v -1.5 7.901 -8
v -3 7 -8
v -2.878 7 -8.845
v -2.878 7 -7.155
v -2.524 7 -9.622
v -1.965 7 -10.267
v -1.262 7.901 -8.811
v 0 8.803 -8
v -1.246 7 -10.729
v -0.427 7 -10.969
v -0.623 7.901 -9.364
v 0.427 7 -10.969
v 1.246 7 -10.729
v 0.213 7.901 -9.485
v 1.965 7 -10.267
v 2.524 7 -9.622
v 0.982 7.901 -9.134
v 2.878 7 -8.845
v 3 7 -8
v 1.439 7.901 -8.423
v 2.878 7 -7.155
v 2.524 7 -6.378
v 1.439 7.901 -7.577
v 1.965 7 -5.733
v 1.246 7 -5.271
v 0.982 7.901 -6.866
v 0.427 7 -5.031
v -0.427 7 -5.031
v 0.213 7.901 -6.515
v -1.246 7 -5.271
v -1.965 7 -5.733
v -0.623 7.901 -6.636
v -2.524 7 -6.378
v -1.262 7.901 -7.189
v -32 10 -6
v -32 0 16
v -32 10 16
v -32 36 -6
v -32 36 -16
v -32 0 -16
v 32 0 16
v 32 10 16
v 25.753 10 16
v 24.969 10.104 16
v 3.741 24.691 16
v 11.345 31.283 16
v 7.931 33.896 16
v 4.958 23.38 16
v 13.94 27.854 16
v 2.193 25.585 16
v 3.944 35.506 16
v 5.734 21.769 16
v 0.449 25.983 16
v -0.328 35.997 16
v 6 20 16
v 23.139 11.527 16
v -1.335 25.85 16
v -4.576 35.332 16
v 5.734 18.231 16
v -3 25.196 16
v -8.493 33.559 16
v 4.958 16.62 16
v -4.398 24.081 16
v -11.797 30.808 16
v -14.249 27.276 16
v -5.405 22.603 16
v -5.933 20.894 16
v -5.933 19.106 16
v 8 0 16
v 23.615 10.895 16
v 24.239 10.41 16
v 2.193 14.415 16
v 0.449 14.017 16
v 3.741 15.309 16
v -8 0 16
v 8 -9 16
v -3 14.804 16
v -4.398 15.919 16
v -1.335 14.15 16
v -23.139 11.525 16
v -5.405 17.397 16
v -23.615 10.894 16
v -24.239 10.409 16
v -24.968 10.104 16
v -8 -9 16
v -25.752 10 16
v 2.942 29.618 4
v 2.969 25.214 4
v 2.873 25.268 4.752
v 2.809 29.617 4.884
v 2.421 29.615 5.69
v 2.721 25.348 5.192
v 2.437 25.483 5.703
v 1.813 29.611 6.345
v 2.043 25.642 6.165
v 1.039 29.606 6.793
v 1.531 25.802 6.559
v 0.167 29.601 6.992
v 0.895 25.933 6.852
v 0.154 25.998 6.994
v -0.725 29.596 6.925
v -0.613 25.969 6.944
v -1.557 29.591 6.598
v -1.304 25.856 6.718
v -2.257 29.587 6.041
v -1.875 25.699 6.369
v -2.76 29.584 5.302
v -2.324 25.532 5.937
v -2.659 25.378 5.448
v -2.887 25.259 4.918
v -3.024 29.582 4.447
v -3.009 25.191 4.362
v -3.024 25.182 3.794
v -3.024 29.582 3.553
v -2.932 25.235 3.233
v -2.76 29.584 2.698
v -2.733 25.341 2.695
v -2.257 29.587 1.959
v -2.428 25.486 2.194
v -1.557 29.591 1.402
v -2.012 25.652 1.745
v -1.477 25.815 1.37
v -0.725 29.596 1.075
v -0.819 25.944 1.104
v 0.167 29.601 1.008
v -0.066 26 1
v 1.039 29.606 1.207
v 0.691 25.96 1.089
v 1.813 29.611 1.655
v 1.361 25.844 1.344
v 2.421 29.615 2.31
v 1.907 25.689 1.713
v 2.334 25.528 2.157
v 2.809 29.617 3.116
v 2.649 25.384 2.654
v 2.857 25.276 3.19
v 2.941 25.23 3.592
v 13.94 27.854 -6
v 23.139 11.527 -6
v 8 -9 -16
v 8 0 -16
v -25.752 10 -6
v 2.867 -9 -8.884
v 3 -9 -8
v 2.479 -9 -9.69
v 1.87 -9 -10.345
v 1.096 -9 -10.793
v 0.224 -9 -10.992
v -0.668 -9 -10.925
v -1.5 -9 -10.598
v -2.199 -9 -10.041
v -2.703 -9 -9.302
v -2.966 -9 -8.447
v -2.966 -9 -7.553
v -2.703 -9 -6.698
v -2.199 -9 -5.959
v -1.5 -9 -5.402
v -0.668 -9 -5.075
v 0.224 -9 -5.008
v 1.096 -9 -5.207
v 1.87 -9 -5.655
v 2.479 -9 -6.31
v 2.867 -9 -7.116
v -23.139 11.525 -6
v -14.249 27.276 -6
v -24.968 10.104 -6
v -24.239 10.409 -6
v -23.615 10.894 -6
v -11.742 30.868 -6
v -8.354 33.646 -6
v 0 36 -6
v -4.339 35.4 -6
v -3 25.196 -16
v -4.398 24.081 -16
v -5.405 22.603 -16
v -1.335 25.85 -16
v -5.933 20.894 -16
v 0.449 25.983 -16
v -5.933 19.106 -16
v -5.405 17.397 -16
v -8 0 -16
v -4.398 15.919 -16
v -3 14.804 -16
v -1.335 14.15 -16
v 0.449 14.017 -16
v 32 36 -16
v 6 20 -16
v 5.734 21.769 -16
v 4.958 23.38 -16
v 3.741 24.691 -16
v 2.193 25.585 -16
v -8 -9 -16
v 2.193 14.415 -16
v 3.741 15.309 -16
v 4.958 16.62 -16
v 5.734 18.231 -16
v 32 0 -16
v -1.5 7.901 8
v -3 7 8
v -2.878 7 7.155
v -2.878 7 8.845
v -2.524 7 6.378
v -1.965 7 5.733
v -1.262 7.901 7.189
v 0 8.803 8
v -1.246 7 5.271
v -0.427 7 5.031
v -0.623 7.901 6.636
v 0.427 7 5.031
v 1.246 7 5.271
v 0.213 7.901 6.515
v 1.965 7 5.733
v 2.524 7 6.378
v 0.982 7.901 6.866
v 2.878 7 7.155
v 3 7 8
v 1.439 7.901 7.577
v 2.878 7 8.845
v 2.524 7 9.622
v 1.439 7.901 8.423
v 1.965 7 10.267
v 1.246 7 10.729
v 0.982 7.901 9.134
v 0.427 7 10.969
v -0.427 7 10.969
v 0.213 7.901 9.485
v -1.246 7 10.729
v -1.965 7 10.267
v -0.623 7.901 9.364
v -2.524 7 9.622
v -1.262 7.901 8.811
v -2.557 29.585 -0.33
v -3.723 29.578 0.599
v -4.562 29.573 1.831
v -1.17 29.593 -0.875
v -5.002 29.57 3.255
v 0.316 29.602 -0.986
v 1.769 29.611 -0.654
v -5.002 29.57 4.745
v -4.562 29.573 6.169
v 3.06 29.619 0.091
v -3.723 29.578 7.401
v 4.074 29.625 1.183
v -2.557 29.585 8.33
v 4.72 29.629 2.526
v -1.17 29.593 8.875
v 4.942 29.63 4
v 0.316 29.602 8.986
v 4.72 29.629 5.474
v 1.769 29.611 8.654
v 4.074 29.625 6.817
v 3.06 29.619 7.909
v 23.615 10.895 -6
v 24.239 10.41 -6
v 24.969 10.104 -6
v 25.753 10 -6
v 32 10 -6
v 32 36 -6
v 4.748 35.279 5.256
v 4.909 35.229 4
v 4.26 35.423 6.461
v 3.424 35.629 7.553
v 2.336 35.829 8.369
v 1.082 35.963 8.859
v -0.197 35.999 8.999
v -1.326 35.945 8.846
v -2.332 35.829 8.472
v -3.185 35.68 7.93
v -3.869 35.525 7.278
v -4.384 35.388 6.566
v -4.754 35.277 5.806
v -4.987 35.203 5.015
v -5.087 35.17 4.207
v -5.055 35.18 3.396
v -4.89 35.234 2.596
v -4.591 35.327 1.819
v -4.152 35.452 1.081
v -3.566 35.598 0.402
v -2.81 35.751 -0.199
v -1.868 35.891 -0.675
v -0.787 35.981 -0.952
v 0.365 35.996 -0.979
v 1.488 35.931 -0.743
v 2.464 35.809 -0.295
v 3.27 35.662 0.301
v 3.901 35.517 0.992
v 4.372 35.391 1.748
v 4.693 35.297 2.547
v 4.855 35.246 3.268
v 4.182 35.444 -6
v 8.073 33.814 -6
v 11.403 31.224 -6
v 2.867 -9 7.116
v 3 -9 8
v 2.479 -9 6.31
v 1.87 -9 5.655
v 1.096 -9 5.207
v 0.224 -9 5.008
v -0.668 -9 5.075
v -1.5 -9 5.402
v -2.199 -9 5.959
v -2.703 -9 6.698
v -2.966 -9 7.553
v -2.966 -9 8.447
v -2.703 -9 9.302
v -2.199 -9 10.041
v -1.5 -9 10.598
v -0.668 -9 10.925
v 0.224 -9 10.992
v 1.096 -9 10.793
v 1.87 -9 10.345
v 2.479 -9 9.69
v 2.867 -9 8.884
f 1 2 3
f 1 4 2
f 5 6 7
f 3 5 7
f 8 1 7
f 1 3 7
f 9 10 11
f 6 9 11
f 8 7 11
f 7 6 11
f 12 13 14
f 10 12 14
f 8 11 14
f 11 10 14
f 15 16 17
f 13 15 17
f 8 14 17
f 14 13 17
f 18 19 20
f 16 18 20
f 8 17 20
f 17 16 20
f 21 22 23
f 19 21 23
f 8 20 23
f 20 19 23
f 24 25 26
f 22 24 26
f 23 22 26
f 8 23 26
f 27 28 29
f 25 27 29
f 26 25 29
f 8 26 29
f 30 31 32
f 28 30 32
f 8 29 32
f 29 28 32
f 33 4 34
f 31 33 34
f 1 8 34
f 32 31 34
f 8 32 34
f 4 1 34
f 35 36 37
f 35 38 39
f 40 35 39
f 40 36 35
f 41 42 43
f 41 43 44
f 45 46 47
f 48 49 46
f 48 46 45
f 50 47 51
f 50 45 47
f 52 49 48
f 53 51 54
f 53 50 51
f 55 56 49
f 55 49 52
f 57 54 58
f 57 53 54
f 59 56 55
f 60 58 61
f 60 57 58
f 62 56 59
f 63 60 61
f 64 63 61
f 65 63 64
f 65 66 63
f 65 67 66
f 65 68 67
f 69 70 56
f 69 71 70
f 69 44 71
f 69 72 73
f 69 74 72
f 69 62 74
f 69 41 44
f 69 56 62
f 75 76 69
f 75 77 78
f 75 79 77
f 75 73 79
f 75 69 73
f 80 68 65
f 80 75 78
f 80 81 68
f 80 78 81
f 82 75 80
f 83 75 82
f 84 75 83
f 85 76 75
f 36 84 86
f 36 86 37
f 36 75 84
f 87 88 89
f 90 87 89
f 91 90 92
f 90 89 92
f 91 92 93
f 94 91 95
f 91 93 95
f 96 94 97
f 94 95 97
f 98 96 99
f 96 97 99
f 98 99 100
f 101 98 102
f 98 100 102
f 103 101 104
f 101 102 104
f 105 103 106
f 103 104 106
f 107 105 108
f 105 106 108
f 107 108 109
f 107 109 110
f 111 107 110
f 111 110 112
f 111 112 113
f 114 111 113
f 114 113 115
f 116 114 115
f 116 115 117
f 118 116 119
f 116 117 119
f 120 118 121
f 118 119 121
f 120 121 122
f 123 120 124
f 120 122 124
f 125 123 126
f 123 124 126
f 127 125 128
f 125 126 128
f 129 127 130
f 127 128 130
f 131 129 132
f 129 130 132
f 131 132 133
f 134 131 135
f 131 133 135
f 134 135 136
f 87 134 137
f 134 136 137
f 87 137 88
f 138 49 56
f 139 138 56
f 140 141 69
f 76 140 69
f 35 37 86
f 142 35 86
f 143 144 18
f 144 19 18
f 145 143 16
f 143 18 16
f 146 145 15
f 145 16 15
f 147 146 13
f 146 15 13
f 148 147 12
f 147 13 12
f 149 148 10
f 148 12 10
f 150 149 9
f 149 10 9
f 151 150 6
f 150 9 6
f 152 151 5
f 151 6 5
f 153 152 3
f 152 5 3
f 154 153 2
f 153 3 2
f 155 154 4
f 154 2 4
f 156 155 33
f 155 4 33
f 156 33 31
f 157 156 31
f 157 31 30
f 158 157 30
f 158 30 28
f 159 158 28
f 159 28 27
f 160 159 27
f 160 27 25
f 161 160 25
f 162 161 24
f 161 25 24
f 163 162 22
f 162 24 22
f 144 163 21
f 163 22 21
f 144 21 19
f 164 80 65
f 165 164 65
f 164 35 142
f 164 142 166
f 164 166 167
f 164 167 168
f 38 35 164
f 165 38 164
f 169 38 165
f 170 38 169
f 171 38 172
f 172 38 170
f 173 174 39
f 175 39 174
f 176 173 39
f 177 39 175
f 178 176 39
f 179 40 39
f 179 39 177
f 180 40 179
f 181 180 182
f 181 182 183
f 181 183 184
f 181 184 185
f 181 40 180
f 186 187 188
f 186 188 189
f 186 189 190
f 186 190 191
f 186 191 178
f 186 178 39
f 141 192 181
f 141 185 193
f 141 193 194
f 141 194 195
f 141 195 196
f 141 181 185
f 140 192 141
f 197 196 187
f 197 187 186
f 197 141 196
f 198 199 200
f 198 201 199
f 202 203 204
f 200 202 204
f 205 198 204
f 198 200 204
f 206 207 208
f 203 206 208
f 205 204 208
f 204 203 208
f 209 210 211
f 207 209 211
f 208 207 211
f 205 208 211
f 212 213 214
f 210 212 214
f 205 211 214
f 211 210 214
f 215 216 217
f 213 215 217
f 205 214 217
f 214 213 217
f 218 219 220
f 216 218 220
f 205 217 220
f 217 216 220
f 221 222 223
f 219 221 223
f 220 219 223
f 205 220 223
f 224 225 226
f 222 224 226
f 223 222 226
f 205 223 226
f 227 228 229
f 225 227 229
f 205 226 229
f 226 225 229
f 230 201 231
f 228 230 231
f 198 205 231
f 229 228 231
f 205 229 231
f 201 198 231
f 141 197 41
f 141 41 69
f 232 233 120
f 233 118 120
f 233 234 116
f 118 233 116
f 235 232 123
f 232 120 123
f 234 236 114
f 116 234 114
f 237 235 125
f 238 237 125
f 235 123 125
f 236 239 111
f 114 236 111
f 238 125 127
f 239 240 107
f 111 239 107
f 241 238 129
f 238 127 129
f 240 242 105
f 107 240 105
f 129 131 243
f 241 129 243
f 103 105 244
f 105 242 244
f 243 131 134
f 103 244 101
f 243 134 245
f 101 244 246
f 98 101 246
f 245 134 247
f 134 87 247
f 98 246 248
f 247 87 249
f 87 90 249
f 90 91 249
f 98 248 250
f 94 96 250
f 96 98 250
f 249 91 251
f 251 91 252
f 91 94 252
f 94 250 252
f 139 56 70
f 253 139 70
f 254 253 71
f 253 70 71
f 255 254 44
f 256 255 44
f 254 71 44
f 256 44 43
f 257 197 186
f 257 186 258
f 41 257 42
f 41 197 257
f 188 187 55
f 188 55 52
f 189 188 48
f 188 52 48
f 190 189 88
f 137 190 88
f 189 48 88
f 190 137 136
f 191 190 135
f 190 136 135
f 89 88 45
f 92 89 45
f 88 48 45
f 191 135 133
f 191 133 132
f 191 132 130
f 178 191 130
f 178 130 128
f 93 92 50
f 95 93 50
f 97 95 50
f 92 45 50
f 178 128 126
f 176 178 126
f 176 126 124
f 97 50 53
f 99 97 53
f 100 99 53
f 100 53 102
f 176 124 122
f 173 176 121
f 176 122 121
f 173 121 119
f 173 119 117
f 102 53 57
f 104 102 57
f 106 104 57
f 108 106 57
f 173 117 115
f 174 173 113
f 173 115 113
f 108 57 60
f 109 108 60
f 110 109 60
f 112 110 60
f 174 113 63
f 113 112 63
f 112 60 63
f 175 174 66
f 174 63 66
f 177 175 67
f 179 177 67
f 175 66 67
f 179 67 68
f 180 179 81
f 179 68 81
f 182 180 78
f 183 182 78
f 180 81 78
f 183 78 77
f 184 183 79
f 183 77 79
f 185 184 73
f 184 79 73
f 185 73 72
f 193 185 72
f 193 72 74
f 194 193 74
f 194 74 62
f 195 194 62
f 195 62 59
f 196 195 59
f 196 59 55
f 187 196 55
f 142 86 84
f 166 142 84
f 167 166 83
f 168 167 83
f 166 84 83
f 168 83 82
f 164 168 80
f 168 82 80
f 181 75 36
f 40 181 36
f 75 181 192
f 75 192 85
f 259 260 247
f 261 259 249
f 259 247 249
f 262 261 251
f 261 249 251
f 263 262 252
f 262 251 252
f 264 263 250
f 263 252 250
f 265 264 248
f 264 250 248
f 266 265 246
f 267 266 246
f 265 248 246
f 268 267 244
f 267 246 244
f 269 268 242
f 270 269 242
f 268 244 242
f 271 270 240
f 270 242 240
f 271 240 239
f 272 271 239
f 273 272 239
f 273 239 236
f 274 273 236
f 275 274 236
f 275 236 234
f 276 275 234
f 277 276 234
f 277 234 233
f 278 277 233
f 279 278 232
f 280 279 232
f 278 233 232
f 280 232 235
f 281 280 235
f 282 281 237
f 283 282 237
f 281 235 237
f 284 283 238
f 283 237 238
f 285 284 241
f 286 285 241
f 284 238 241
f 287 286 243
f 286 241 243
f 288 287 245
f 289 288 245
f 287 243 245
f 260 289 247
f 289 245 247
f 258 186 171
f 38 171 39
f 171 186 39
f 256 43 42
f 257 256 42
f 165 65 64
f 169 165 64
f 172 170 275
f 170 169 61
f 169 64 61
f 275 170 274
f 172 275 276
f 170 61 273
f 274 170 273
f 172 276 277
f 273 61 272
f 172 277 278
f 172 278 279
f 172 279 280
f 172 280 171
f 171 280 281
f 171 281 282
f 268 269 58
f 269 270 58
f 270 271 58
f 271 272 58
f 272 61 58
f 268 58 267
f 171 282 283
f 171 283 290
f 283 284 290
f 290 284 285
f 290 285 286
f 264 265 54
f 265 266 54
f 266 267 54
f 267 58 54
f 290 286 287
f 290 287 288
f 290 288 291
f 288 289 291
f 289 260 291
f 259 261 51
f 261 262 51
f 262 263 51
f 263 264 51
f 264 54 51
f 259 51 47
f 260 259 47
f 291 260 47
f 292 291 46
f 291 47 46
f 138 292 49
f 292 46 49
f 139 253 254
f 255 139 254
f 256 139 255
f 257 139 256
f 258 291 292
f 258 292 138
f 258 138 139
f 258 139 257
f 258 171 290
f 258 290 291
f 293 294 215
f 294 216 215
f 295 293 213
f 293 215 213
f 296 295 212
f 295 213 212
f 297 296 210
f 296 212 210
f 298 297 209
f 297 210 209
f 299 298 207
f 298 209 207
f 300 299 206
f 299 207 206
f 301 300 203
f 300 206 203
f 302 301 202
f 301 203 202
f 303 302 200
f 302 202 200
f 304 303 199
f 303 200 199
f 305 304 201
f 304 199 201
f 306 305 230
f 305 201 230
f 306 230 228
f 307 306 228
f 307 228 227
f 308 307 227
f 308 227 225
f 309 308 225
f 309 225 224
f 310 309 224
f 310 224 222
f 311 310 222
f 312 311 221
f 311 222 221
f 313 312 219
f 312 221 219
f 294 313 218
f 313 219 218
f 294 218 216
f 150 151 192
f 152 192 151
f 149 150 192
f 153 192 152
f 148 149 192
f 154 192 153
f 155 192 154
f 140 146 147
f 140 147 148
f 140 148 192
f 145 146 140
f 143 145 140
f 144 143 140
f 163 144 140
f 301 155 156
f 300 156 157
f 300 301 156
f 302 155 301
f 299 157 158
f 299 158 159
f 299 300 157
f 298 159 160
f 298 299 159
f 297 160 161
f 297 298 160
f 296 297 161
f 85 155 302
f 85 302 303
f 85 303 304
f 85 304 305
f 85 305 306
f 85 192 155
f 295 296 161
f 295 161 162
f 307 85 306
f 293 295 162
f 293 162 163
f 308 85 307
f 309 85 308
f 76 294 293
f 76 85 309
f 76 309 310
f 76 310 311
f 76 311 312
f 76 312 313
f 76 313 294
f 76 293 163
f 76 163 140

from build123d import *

# Parameters (mm, degrees)
BOSS_EXTRUDE1_DEPTH       = 36
CUT_EXTRUDE6_DEPTH        = 22
SKETCH11_R                = 6.000000000000001
CUT_EXTRUDE7_DEPTH        = 58.827329183593626
SKETCH12_W                = 16
SKETCH12_H                = 32
BOSS_EXTRUDE2_DEPTH       = 9
F_1_0MM_DOWEL_HOLE1_D     = 6
F_1_0MM_DOWEL_HOLE1_DEPTH = 16
F_1_0MM_DOWEL_HOLE1_TIP   = 1.8025818570826808


# Read off the part's stored shape, not the designer's step: CBORE for M6 Hex Socket Head Cap Screw2
with BuildPart() as part:
    # Sketch1 → Boss-Extrude1 (new body)
    with BuildSketch(Plane(origin=(0, 0, 0), x_dir=(1, 0, 0), z_dir=(0, 1, 0))):
        Polygon((-32.000000000000014, 16), (32, 16), (32, -16), (-32.00000000000001, -16), align=None)
    extrude(amount=BOSS_EXTRUDE1_DEPTH)

    # Sketch2 → Cut-Extrude6 (cut)
    with BuildSketch(Plane.XY.offset(16)):
        with BuildLine():
            Line((0.00047501965244123, 36), (-32.00000000000001, 36))
            Line((-32.00000000000001, 36), (-32.00000000000001, 10))
            Line((-32.00000000000001, 10), (-25.751640415984067, 10))
            ThreePointArc((-25.751640415984067, 10), (-24.238970505556754, 10.409280072626942), (-23.139037695662964, 11.5254468386081))
            Line((-23.139037695662964, 11.5254468386081), (-14.249494850462119, 27.275875122834456))
            ThreePointArc((-14.249494850462119, 27.275875122834453), (-8.35374541517065, 33.645768615897694), (0.00047501965243812, 36.00000000705136))
        make_face()
        with BuildLine():
            Line((31.999999999999993, 36), (0.00047501965244123, 36))
            ThreePointArc((0.00047501965243812, 36.00000000705136), (8.07302482579058, 33.814265808302636), (13.940018609128462, 27.85424246049306))
            Line((13.940018609128462, 27.85424246049306), (23.139425445581196, 11.527329539979691))
            ThreePointArc((23.139425445581196, 11.527329539979691), (24.239486779956046, 10.409825162265975), (25.753089868605628, 10))
            Line((25.753089868605628, 10), (32, 10.000000000000002))
            Line((32, 10.000000000000002), (32, 36))
        make_face()
    extrude(amount=-CUT_EXTRUDE6_DEPTH, mode=Mode.SUBTRACT)

    # Sketch11 → Cut-Extrude7 (cut, through all)
    with BuildSketch(Plane.XY.offset(16)):
        with Locations((0.00047501966492051, 20.000000007051366)):
            Circle(SKETCH11_R)
    extrude(amount=-CUT_EXTRUDE7_DEPTH, mode=Mode.SUBTRACT)

    # Sketch12 → Boss-Extrude2 (add)
    with BuildSketch(Plane.XZ):
        Rectangle(SKETCH12_W, SKETCH12_H)
    extrude(amount=BOSS_EXTRUDE2_DEPTH)

    # CBORE for M6 Hex Socket Head Cap Scr 2 → CBORE for M6 Hex Socket Head Cap Screw2 (revolve, cut)
    with BuildSketch(Plane(origin=(0.121141314, 0.00073091, 3.999999998), x_dir=(0.9999817987234716, 0.006033425376210058, 0), z_dir=(0, 0, -1))):
        Polygon((3, -29.599633116), (3, -25.195487191), (0, -25.195487191), (0, -35.999736435), (5, -35.999736435), (5, -29.599633116), align=None)
    revolve(axis=Axis((0.121141314, 0.00073091, 3.999999998), (0.006033425376210058, -0.9999817987234716, 0)), mode=Mode.SUBTRACT)

    # Ø1.0mm Dowel Hole1
    with Locations(Plane(origin=(0, -9, 0), x_dir=(-1, 0, 0), z_dir=(0, -1, 0))):
        with Locations((0, 8), (0, -8)):
            Hole(F_1_0MM_DOWEL_HOLE1_D / 2, depth=F_1_0MM_DOWEL_HOLE1_DEPTH)
            with Locations((0, 0, -(F_1_0MM_DOWEL_HOLE1_DEPTH + F_1_0MM_DOWEL_HOLE1_TIP / 2))):  # 118° drill point
                Cone(0, F_1_0MM_DOWEL_HOLE1_D / 2, F_1_0MM_DOWEL_HOLE1_TIP, mode=Mode.SUBTRACT)


solid = part.part
